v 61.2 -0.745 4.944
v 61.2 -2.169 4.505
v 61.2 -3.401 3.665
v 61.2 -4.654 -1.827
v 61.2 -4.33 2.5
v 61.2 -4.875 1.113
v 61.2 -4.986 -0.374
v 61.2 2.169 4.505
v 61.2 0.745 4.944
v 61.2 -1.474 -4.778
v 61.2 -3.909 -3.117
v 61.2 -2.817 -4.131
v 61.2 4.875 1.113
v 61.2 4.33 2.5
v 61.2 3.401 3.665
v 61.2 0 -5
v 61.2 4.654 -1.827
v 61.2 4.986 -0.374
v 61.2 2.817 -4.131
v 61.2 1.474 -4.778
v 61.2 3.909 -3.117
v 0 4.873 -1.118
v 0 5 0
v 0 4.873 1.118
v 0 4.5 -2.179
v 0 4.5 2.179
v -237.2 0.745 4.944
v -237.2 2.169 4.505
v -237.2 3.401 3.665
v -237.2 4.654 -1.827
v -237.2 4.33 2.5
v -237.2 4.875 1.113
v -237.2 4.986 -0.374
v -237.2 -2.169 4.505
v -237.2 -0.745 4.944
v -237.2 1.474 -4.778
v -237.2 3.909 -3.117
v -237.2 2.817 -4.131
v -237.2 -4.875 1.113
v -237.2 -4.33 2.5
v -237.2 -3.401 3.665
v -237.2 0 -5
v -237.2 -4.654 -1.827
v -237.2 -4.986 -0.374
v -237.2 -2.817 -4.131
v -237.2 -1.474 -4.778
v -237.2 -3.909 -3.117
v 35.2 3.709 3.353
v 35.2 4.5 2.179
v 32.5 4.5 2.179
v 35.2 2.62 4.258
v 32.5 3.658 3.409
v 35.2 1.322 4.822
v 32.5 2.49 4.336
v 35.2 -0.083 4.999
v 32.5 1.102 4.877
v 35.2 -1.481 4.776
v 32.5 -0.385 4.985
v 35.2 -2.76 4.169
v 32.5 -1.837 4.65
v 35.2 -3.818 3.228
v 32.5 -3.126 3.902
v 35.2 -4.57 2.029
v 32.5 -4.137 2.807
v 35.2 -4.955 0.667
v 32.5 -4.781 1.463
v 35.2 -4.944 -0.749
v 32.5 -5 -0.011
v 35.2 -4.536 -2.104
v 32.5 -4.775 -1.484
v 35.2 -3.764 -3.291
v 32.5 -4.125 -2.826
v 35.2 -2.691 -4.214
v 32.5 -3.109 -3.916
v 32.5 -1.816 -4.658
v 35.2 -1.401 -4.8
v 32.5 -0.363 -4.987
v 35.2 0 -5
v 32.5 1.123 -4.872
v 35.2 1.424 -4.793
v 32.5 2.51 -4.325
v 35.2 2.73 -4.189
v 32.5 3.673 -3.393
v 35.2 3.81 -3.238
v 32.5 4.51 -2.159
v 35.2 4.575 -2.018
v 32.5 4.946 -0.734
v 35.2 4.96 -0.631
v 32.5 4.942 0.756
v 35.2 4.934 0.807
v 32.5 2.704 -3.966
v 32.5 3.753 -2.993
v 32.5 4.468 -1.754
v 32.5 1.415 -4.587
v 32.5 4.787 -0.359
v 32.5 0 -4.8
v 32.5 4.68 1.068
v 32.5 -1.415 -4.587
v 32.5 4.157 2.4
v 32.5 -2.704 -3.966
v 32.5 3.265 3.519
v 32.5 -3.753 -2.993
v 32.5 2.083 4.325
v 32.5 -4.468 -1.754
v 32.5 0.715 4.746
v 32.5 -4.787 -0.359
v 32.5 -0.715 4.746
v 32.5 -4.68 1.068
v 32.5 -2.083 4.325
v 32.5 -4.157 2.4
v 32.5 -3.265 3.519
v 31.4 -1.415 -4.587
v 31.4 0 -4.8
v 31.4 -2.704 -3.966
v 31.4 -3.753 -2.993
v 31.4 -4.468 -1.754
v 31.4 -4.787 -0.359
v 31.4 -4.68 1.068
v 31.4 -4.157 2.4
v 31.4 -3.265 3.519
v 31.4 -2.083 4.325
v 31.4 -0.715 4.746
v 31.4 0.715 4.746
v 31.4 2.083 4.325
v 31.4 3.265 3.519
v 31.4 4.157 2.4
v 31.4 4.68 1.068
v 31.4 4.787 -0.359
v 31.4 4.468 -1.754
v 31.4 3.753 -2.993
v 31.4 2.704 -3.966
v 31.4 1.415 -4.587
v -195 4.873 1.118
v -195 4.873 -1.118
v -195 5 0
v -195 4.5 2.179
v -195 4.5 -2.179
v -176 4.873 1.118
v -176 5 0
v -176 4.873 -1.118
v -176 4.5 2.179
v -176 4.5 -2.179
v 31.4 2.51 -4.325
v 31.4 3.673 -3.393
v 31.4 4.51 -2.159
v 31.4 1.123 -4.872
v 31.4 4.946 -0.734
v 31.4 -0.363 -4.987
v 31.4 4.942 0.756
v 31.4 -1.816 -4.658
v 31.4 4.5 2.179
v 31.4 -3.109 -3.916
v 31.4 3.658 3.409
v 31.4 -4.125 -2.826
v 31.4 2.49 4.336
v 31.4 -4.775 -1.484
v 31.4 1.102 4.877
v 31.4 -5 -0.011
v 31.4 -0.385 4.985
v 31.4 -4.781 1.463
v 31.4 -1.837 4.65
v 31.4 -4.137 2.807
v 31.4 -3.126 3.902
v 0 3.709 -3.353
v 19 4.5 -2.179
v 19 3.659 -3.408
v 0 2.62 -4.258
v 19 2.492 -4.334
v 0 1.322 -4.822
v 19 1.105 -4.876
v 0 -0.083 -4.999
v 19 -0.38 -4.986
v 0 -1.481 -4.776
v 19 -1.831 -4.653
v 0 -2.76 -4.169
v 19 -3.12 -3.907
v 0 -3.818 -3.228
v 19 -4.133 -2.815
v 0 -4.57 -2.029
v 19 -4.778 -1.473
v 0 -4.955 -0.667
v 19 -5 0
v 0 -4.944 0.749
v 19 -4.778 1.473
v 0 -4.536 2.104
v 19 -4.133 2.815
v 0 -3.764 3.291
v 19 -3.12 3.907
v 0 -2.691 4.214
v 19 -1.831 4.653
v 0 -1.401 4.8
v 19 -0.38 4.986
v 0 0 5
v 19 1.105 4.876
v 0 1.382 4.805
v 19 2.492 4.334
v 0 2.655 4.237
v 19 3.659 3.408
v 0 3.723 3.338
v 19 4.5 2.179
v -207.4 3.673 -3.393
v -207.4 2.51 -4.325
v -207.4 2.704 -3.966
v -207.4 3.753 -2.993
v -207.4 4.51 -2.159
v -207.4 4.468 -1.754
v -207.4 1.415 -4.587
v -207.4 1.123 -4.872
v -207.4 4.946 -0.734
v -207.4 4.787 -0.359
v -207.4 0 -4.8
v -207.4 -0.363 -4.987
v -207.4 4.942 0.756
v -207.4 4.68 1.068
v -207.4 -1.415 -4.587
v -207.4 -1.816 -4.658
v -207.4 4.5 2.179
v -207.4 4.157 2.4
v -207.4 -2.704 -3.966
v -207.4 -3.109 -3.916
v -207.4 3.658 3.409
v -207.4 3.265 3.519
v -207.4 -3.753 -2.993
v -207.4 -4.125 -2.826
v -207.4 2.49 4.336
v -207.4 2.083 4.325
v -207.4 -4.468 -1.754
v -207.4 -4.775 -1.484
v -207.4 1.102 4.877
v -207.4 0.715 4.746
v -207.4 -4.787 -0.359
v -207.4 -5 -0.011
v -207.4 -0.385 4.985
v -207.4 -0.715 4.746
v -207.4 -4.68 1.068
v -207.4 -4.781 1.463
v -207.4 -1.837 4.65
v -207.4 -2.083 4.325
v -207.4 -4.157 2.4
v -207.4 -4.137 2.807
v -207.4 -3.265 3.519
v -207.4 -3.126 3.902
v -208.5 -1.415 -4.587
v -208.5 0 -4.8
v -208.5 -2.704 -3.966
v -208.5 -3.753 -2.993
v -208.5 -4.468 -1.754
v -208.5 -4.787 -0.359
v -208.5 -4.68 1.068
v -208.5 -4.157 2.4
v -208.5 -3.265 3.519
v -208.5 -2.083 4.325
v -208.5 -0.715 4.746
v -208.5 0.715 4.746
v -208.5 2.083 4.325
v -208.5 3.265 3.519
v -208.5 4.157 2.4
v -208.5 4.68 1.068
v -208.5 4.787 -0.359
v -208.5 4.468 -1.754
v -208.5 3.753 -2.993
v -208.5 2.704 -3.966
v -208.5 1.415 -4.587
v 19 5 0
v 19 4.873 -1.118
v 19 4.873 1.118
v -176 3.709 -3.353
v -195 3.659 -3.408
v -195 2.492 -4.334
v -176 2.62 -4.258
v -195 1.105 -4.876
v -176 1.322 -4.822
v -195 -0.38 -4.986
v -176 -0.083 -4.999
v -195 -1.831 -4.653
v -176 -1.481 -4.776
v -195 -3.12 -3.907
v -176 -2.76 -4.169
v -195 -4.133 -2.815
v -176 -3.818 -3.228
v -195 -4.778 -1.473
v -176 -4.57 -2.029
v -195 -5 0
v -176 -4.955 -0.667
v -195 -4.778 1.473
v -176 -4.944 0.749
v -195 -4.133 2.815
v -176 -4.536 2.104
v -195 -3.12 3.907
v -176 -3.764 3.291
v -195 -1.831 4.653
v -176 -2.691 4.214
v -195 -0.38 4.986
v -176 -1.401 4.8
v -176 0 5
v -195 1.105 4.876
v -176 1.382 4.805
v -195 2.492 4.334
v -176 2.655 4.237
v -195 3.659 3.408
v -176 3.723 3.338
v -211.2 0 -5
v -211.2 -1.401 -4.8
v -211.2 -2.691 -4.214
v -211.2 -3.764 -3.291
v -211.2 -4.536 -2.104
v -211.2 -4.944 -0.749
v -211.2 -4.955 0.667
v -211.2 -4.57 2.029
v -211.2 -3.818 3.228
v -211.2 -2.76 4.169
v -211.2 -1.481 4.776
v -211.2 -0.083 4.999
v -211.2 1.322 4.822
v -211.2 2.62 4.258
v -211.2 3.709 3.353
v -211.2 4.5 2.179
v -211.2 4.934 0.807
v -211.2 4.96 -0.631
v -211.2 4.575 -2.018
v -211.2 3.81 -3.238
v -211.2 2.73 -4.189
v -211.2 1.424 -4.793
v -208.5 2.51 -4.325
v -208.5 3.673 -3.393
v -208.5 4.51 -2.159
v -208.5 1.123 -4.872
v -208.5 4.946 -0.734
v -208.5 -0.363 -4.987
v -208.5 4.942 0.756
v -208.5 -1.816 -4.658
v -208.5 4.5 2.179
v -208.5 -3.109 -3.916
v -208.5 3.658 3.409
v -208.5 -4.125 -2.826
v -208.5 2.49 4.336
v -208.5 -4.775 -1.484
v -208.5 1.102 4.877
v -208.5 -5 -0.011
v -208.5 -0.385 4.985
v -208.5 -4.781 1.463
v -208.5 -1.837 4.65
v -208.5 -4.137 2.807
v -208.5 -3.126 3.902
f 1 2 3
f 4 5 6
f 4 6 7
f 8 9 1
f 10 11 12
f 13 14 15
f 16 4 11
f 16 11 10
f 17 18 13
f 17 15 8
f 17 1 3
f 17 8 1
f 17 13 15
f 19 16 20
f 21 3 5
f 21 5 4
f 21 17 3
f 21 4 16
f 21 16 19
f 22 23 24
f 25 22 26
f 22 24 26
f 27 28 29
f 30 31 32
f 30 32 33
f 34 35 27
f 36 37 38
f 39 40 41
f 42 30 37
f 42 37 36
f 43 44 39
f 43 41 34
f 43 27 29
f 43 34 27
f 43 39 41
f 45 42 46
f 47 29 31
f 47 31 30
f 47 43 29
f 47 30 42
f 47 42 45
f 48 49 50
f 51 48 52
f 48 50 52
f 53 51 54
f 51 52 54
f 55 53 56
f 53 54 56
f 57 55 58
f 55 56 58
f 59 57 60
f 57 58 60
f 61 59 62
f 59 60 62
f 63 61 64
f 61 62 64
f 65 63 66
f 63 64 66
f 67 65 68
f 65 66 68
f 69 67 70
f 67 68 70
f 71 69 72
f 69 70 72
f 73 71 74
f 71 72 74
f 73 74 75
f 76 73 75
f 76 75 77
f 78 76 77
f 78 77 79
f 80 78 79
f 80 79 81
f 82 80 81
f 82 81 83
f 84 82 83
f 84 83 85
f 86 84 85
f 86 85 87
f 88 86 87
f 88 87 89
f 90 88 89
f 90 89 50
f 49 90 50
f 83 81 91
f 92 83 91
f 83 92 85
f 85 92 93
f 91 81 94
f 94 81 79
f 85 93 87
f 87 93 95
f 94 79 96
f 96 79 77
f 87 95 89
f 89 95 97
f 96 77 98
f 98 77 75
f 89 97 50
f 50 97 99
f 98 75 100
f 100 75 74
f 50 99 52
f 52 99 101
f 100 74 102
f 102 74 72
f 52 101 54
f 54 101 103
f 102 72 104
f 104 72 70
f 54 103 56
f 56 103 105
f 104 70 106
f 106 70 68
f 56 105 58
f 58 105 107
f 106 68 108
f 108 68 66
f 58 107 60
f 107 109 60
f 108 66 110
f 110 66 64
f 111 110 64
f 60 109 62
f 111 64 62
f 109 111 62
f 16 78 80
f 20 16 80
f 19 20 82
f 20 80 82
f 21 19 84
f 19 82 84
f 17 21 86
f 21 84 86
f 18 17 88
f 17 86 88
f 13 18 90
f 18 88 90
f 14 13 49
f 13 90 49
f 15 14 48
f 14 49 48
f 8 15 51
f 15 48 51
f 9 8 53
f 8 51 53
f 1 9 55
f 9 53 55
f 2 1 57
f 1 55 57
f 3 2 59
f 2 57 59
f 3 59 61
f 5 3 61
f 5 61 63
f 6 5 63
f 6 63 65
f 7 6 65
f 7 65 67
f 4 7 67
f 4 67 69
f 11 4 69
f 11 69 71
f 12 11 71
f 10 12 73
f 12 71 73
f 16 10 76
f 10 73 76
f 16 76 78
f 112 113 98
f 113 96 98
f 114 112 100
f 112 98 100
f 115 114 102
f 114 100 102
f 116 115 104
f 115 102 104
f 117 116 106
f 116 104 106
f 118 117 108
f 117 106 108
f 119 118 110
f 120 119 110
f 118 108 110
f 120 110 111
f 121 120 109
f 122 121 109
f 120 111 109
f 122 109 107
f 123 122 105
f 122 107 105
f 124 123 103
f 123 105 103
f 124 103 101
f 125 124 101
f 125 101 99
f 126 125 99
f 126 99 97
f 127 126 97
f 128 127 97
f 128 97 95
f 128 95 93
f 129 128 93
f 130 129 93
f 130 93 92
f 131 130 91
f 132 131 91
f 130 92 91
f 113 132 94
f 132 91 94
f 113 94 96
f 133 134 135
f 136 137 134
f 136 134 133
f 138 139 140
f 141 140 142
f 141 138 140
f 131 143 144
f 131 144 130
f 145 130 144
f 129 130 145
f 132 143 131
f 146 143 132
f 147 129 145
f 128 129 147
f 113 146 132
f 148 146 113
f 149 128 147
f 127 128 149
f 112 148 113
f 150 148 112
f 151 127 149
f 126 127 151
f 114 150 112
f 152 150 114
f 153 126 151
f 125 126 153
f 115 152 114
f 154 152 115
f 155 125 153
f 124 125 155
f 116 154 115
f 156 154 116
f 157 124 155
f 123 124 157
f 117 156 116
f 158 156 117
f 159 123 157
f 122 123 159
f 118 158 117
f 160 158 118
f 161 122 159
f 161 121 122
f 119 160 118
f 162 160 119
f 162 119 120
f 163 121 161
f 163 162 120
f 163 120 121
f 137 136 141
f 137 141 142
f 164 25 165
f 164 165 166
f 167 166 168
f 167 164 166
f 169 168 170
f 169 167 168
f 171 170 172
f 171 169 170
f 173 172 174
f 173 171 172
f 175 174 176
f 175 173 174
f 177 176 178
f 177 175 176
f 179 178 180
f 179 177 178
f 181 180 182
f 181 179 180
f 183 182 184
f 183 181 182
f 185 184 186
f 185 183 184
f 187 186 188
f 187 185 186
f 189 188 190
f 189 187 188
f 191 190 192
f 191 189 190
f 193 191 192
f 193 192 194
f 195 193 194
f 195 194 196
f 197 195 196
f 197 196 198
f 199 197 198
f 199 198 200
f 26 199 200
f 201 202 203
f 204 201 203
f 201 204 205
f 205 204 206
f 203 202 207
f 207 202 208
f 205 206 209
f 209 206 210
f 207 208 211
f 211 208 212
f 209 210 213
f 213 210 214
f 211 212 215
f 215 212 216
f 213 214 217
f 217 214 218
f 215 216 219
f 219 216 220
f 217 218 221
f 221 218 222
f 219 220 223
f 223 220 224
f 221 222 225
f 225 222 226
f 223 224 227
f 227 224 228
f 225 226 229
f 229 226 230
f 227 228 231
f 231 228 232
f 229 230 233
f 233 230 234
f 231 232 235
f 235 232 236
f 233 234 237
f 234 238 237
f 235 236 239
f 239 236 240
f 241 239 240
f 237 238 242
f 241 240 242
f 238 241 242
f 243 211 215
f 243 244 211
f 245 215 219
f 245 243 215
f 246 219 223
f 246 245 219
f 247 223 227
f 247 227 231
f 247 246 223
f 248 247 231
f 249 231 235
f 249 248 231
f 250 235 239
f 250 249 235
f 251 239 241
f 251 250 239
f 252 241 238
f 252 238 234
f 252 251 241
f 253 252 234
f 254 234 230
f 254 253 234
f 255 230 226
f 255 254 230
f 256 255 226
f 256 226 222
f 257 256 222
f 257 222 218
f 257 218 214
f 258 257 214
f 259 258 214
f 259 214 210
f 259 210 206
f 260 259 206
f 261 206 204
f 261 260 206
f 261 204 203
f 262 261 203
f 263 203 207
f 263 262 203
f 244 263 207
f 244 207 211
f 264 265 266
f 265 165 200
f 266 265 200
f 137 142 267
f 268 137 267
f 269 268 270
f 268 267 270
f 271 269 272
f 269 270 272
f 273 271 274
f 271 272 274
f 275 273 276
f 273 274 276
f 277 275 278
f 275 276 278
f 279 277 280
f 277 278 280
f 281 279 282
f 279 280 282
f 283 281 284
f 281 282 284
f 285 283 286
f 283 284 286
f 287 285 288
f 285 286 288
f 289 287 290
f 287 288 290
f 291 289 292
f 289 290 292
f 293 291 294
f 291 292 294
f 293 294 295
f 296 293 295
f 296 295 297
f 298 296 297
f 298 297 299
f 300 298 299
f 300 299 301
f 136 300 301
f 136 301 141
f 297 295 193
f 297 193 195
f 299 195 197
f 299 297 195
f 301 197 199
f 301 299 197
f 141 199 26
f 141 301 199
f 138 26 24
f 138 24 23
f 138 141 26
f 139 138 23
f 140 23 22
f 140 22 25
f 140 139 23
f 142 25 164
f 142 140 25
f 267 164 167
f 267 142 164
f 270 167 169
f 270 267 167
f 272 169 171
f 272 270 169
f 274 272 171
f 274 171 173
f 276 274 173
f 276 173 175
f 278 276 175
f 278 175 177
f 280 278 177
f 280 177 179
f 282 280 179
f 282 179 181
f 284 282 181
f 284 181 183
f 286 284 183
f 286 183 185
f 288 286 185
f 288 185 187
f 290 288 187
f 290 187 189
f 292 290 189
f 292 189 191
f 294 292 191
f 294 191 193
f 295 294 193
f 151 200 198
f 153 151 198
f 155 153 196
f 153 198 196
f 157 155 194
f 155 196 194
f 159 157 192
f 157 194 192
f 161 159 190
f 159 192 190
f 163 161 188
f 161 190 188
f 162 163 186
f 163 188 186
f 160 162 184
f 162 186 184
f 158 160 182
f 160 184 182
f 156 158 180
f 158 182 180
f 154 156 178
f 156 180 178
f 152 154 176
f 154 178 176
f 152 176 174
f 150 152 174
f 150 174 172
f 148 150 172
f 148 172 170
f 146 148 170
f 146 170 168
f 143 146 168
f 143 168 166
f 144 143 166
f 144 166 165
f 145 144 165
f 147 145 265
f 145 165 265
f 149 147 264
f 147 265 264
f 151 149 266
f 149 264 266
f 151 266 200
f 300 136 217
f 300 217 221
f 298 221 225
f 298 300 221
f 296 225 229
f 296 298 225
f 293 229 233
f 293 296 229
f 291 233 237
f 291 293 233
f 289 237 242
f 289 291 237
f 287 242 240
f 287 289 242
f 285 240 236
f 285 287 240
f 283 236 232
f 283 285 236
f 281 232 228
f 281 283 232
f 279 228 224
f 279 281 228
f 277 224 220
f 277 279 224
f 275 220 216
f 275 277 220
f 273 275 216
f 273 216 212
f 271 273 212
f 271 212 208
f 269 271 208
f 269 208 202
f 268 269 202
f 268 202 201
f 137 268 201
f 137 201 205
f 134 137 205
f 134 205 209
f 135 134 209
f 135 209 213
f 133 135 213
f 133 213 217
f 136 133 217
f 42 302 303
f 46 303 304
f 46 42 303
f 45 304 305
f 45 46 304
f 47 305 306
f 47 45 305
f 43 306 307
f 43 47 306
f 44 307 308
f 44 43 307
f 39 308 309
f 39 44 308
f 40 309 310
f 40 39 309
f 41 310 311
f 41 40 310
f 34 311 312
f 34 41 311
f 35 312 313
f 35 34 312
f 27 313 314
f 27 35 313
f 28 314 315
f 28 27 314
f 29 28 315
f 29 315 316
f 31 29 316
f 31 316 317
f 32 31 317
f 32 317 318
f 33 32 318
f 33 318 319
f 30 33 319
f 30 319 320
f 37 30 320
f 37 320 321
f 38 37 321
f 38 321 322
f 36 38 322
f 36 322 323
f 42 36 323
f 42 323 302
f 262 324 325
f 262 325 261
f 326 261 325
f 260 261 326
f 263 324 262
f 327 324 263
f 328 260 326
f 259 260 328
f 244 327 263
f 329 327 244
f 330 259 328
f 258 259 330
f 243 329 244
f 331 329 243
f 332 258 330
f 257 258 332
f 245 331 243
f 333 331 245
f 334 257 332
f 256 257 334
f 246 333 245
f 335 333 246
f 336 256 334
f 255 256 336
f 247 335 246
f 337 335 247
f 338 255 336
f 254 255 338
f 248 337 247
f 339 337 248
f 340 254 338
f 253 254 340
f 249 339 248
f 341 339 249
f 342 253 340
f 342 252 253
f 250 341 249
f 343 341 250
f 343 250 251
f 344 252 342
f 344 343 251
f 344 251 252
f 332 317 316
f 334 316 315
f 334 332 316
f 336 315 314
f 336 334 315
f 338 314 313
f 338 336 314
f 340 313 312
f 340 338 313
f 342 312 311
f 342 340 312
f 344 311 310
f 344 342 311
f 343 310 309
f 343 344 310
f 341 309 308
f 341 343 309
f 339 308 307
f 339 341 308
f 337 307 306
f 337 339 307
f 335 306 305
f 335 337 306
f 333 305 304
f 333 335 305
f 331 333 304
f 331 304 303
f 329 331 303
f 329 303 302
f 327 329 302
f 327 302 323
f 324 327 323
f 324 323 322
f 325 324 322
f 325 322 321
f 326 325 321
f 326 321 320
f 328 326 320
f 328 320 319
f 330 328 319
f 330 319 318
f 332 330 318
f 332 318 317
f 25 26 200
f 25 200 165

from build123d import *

# Parameters (mm, degrees)
EXTRUDE_1_DEPTH = 19
SKETCH_2_R      = 5
EXTRUDE_2_DEPTH = 16.2
SKETCH_5_W      = 1.1
SKETCH_5_H      = 0.2
EXTRUDE_START   = 176
SKETCH_4_R      = 5
EXTRUDE_4_DEPTH = 176
SKETCH_6_R      = 5
EXTRUDE_5_DEPTH = 26
EXTRUDE_START_2 = 26
SKETCH_7_R      = 5
EXTRUDE_6_DEPTH = 26


with BuildPart() as part:
    # 草图1 → 拉伸1 (new body)
    with BuildSketch(Plane(origin=(0, 0, 0), x_dir=(0, 0, -1), z_dir=(1, 0, 0))):
        with BuildLine():
            Line((-2.179449472, 4.5), (2.179449472, 4.5))
            ThreePointArc((2.179449472, 4.5), (0, -5), (-2.179449472, 4.5))
        make_face()
    extrude_1 = extrude(amount=EXTRUDE_1_DEPTH)

    # 草图2 → 拉伸2 (add)
    with BuildSketch(Plane(origin=(19, 0, 0), x_dir=(0, 0, -1), z_dir=(1, 0, 0))):
        Circle(SKETCH_2_R)
    extrude_2 = extrude(amount=EXTRUDE_2_DEPTH)

    # 草图5 → 切除-旋转1 (revolve, cut)
    with BuildSketch(Plane(origin=(0, 0, 0), x_dir=(1, 0, 0), z_dir=(0, 1, 0))):
        with Locations((31.95, 4.9)):
            Rectangle(SKETCH_5_W, SKETCH_5_H)
    cut_revolve_1 = revolve(axis=Axis((19, 0, 0), (-1, 0, 0)), mode=Mode.SUBTRACT)

    # 草图4 → 拉伸4 (add)
    with BuildSketch(Plane.ZY.offset(EXTRUDE_START)):
        Circle(SKETCH_4_R)
    extrude(amount=-EXTRUDE_4_DEPTH)

    # 镜向1: 拉伸1, 拉伸2, 切除-旋转1 across plane
    add(extrude_1.mirror(Plane.ZY.offset(88)))
    add(extrude_2.mirror(Plane.ZY.offset(88)))
    add(cut_revolve_1.mirror(Plane.ZY.offset(88)), mode=Mode.SUBTRACT)

    # 草图6 → 拉伸5 (add)
    with BuildSketch(Plane(origin=(35.2, 0, 0), x_dir=(0, 0, -1), z_dir=(1, 0, 0))):
        Circle(SKETCH_6_R)
    extrude(amount=EXTRUDE_5_DEPTH)

    # 草图7 → 拉伸6 (add)
    with BuildSketch(Plane.ZY.offset(211.2).offset(EXTRUDE_START_2)):
        Circle(SKETCH_7_R)
    extrude(amount=-EXTRUDE_6_DEPTH)


solid = part.part
